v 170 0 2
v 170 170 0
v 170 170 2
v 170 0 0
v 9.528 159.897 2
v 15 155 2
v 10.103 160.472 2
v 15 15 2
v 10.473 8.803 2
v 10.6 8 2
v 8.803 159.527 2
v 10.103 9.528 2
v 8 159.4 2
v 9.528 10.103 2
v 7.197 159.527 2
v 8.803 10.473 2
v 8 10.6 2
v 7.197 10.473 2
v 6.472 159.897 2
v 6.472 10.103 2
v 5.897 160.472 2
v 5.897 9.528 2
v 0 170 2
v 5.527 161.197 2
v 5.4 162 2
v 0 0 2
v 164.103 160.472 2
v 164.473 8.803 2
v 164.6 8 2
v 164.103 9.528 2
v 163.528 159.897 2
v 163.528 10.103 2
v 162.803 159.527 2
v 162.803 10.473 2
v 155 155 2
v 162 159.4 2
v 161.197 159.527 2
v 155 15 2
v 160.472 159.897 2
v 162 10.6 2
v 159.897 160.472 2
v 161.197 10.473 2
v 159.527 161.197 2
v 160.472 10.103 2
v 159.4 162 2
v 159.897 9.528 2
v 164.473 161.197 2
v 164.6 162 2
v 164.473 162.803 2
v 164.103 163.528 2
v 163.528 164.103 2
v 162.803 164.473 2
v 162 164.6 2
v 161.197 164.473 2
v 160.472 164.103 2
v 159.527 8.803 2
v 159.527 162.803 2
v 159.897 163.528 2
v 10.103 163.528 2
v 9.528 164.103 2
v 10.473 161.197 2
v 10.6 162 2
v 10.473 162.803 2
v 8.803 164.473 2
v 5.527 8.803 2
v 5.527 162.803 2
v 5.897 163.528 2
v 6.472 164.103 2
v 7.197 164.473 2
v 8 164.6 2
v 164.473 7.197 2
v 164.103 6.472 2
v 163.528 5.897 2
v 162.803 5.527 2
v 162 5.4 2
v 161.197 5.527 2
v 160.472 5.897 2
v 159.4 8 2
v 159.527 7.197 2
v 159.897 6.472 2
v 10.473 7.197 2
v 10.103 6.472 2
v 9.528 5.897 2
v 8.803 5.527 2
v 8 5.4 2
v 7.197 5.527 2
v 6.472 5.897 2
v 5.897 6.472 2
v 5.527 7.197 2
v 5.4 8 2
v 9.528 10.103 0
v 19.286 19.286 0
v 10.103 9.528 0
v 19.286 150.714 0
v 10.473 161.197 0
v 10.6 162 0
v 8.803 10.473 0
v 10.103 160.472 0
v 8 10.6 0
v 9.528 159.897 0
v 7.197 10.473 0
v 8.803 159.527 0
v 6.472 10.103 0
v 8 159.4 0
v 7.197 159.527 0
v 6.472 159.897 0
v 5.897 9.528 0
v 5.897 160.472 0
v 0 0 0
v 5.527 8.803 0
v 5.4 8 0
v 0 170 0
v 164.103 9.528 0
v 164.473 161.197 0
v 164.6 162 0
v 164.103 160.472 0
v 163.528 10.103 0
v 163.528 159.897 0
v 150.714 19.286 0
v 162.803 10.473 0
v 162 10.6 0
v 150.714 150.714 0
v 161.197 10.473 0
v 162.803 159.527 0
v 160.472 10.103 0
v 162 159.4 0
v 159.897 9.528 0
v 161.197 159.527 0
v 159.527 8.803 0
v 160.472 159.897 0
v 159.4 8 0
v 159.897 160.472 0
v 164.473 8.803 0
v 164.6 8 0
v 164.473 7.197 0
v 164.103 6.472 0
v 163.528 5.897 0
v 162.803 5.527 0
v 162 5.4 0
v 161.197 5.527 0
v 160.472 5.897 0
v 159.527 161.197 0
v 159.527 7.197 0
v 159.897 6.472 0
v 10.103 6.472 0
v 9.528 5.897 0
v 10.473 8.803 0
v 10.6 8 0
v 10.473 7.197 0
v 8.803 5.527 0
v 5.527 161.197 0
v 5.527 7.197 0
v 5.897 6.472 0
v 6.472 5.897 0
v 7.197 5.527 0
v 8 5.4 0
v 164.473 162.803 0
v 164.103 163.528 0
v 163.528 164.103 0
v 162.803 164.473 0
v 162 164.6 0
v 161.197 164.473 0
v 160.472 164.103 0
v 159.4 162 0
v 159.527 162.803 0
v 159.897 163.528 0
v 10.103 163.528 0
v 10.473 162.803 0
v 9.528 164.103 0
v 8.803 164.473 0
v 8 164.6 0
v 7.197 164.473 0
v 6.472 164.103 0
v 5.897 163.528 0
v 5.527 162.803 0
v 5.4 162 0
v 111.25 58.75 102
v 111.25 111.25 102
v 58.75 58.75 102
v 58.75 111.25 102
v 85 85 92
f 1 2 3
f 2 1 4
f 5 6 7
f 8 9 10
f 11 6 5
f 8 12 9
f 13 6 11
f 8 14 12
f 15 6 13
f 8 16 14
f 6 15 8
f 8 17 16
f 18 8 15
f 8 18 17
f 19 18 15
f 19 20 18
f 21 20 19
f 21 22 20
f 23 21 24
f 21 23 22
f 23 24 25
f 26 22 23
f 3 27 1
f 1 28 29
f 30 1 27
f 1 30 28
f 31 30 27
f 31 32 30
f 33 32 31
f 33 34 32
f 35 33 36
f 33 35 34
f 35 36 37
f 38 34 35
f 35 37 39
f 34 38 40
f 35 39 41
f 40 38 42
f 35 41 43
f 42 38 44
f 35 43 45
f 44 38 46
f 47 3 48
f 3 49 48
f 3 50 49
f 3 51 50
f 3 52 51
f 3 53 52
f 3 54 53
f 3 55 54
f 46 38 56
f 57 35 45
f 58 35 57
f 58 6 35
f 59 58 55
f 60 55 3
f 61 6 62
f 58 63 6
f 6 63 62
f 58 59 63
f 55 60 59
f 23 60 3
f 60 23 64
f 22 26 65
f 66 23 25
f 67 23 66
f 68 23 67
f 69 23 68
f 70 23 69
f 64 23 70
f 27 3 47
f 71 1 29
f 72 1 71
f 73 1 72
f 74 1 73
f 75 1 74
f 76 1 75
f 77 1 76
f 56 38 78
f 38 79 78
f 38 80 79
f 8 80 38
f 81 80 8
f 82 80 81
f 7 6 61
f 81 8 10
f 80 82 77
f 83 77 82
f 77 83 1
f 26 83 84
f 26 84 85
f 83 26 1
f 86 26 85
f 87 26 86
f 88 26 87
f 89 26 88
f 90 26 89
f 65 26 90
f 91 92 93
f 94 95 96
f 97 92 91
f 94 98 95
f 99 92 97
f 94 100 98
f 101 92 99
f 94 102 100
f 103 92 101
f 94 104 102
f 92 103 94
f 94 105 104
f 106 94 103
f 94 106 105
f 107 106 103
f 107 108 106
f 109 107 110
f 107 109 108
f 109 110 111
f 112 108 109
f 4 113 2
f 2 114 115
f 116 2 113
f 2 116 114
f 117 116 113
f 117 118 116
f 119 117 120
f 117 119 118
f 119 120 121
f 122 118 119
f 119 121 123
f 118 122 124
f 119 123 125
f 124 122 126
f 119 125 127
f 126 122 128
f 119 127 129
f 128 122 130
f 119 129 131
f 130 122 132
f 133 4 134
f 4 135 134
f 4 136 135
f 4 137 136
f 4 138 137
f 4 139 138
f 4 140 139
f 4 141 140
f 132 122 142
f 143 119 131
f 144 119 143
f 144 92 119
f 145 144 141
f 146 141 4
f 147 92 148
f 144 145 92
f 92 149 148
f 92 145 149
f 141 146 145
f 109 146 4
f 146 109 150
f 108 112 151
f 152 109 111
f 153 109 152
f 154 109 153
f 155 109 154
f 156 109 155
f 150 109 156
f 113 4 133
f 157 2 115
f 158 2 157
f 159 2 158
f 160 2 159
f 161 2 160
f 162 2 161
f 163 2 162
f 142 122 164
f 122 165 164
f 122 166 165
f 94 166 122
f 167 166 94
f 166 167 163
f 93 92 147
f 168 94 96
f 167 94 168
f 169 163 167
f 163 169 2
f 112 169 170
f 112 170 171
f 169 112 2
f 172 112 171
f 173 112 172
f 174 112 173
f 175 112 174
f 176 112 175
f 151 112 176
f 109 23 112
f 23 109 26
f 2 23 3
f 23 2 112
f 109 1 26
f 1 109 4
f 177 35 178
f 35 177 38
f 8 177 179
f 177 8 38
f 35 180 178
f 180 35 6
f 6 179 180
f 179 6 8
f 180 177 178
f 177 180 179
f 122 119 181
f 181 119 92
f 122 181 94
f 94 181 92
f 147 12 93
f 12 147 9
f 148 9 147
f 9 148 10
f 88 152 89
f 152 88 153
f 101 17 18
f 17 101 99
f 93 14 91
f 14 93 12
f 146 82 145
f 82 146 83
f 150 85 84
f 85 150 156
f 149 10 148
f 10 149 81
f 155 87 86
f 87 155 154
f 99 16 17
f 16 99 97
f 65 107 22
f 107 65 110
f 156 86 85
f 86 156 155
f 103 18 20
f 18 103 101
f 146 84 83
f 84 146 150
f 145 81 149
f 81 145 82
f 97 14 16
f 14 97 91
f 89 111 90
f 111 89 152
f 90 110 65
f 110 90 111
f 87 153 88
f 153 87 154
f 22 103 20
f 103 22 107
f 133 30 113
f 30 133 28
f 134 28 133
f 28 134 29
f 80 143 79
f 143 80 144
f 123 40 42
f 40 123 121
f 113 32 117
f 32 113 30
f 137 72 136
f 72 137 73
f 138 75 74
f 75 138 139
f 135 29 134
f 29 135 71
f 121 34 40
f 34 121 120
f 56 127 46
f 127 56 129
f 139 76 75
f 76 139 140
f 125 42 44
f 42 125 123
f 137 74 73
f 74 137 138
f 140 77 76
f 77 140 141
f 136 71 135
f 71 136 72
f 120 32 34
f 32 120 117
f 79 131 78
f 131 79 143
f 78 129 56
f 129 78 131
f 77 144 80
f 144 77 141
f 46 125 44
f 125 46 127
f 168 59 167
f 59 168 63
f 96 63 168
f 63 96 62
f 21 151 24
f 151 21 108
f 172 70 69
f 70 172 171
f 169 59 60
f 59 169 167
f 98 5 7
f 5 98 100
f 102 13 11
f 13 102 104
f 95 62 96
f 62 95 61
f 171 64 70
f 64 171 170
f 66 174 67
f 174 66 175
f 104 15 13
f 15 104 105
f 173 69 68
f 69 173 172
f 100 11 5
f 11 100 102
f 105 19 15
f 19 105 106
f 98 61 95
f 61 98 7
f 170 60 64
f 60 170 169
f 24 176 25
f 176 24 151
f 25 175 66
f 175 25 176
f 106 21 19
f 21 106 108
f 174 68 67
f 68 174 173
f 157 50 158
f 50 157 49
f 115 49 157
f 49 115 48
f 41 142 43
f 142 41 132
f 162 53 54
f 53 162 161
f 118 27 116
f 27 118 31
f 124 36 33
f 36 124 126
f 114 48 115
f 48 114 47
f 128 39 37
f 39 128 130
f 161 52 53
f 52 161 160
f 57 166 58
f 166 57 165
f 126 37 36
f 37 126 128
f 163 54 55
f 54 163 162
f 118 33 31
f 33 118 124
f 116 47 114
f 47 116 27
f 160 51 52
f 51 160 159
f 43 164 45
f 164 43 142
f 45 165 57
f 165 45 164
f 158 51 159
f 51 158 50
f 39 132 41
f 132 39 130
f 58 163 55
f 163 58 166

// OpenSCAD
//
//
//  Old style steet lamp cap
//
//   R. Lazure  Oct 31, 2018
//
//
height= 160;
cut_ht= 100;
base= 140;
lip=15;
lip_thick=2;
//
inner_height=cut_ht-2;
plate_width=base+2*lip;
echo("plate width= ",plate_width);

difference(){
      union(){ 
//
// bottom plate
color("red")
cube(size = [plate_width,plate_width,lip_thick], center = false);
// rising pyramid
translate([lip+base/2,lip+base/2,lip_thick])
scale([base/20,base/20,height/10])
polyhedron(
  points=[ [10,10,0],[10,-10,0],[-10,-10,0],[-10,10,0], // the four points at base
           [0,0,10]  ],                                 // the apex point 
  faces=[ [0,1,4],[1,2,4],[2,3,4],[3,0,4],              // each triangle side
              [1,0,3],[2,1,3] ]                         // two triangles for square base
 );
}
//
//   cut top point
//
color("green")
translate([0,0,cut_ht+lip_thick])
cube(size = [300,300,300], center = false);
//
//  hollow out the inside, no need for support
//
color("yellow")
translate([lip+base/2,lip+base/2,-lip_thick-4])
scale([base/20,base/20,inner_height/10])
polyhedron(
  points=[ [10,10,0],[10,-10,0],[-10,-10,0],[-10,10,0], // the four points at base
           [0,0,10]  ],                                 // the apex point 
  faces=[ [0,1,4],[1,2,4],[2,3,4],[3,0,4],              // each triangle side
              [1,0,3],[2,1,3] ]                         // two triangles for square base
 );

//
//  screw holes
//
//  model specific, not general values
$fn=20;
color("blue")
translate([8,8,0])
cylinder(h=10, r=2.6, center=true);
color("blue")
translate([162,8,0])
cylinder(h=10, r=2.6, center=true);
color("blue")
translate([8,162,0])
cylinder(h=10, r=2.6, center=true);
color("blue")
translate([162,162,0])
cylinder(h=10, r=2.6, center=true);
}

 
